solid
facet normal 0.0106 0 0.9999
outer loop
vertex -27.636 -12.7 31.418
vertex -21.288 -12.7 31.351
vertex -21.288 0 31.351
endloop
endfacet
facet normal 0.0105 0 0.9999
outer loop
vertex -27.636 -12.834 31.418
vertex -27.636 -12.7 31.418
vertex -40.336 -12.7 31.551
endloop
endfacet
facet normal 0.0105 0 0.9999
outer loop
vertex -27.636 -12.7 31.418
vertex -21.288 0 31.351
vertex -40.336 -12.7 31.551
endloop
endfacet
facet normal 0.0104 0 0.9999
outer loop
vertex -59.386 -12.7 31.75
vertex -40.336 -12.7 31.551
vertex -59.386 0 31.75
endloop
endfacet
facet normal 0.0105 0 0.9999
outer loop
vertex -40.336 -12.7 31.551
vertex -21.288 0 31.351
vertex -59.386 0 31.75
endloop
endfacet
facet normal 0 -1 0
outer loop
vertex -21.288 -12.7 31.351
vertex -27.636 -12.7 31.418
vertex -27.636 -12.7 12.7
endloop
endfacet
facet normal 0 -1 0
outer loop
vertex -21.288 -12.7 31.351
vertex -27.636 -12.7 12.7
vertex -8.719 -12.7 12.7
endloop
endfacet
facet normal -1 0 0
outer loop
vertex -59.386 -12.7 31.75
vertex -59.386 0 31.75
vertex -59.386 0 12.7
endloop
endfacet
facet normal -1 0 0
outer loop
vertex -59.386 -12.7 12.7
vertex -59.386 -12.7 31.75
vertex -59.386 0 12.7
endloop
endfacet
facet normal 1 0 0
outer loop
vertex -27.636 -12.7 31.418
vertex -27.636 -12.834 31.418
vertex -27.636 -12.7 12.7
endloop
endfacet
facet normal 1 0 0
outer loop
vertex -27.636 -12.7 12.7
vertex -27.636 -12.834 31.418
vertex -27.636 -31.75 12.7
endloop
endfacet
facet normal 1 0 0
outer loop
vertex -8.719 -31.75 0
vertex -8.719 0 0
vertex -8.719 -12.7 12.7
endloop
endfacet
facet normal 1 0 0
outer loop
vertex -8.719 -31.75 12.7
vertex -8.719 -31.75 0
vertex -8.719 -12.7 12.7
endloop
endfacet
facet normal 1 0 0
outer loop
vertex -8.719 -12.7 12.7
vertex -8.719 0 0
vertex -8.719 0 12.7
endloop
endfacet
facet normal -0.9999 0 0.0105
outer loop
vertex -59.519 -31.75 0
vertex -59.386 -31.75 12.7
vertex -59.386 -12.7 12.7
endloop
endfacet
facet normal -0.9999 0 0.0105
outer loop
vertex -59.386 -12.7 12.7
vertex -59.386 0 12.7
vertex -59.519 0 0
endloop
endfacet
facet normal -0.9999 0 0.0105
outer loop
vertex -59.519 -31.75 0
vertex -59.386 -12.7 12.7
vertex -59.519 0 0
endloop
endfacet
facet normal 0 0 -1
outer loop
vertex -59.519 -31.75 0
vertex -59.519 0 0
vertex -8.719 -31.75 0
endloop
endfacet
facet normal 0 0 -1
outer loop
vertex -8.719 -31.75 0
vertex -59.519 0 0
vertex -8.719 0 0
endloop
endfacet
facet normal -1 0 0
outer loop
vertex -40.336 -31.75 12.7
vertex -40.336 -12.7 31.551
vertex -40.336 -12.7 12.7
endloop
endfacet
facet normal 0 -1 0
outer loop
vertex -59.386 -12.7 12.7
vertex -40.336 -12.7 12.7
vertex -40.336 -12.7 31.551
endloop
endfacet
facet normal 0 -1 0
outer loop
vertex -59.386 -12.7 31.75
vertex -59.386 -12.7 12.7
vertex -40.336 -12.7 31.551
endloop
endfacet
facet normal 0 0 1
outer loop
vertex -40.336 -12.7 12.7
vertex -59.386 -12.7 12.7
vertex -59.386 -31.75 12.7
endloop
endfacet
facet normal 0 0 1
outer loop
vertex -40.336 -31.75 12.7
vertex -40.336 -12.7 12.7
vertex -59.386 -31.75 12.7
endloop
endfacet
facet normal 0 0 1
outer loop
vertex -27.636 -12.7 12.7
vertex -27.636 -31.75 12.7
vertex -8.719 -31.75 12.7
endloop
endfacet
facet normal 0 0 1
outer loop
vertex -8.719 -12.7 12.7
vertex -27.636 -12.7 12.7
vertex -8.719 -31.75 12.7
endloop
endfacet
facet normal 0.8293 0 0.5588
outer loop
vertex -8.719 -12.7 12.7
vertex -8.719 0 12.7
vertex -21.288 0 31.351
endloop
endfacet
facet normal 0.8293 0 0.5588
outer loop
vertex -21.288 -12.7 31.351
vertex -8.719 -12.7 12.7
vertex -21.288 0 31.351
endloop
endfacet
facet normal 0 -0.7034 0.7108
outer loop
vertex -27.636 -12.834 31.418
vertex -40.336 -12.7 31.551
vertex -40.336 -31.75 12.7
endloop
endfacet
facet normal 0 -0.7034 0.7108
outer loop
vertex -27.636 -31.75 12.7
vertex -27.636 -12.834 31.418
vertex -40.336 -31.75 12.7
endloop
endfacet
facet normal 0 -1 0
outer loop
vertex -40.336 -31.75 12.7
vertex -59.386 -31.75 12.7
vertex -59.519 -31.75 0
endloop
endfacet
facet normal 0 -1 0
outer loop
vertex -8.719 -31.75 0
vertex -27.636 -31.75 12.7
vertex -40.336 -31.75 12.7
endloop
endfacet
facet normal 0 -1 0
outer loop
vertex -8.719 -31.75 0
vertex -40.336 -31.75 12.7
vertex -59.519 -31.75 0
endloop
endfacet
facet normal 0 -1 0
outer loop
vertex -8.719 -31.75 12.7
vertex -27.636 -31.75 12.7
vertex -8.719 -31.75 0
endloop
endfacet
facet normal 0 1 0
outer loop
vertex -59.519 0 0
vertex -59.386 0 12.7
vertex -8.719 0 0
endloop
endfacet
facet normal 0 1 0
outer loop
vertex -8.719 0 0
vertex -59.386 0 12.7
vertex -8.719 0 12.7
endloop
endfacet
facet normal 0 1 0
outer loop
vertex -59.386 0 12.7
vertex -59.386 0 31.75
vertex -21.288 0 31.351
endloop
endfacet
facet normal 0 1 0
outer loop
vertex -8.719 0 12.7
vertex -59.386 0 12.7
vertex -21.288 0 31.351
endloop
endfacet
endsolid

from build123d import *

# Parameters (mm, degrees)
F1_DEPTH = 31.75
F2_W     = 19.05
F2_H     = 19.05
F3_DEPTH = 19.05
F5_DEPTH = 12.7
F7_DEPTH = 19.05


with BuildPart() as f1:
    # F0 (on Front) → F1 (new body)
    with BuildSketch(Plane.XZ):
        Polygon((-59.386093, 12.7), (-59.519075, 0), (-8.719075, 0), (-8.719075, 12.7), align=None)
        Polygon((-59.386093, 31.75), (-59.386093, 12.7), (-8.719075, 12.7), (-21.288181, 31.351074), align=None)
    extrude(amount=F1_DEPTH)

    # F2 (on face) → F3 (cut)
    with BuildSketch(Plane(origin=(-59.386093, 0, 0), x_dir=(0, -1, 0), z_dir=(-1, 0, 0))):
        with Locations((22.225, 22.225)):
            Rectangle(F2_W, F2_H)
    extrude(amount=-F3_DEPTH, mode=Mode.SUBTRACT)

    # F4 (on face) → F5 (cut)
    with BuildSketch(Plane(origin=(-40.336093, 0, 0), x_dir=(0, -1, 0), z_dir=(-1, 0, 0))):
        Polygon((12.7, 31.550526), (31.75, 12.7), (31.75, 31.550526), align=None)
    extrude(amount=-F5_DEPTH, mode=Mode.SUBTRACT)

    # F6 (on face) → F7 (cut)
    with BuildSketch(Plane.XZ.offset(31.75)):
        Polygon((-27.636093, 31.417544), (-27.636093, 12.7), (-8.719075, 12.7), (-21.288181, 31.351074), align=None)
    extrude(amount=-F7_DEPTH, mode=Mode.SUBTRACT)


solid = f1.part
